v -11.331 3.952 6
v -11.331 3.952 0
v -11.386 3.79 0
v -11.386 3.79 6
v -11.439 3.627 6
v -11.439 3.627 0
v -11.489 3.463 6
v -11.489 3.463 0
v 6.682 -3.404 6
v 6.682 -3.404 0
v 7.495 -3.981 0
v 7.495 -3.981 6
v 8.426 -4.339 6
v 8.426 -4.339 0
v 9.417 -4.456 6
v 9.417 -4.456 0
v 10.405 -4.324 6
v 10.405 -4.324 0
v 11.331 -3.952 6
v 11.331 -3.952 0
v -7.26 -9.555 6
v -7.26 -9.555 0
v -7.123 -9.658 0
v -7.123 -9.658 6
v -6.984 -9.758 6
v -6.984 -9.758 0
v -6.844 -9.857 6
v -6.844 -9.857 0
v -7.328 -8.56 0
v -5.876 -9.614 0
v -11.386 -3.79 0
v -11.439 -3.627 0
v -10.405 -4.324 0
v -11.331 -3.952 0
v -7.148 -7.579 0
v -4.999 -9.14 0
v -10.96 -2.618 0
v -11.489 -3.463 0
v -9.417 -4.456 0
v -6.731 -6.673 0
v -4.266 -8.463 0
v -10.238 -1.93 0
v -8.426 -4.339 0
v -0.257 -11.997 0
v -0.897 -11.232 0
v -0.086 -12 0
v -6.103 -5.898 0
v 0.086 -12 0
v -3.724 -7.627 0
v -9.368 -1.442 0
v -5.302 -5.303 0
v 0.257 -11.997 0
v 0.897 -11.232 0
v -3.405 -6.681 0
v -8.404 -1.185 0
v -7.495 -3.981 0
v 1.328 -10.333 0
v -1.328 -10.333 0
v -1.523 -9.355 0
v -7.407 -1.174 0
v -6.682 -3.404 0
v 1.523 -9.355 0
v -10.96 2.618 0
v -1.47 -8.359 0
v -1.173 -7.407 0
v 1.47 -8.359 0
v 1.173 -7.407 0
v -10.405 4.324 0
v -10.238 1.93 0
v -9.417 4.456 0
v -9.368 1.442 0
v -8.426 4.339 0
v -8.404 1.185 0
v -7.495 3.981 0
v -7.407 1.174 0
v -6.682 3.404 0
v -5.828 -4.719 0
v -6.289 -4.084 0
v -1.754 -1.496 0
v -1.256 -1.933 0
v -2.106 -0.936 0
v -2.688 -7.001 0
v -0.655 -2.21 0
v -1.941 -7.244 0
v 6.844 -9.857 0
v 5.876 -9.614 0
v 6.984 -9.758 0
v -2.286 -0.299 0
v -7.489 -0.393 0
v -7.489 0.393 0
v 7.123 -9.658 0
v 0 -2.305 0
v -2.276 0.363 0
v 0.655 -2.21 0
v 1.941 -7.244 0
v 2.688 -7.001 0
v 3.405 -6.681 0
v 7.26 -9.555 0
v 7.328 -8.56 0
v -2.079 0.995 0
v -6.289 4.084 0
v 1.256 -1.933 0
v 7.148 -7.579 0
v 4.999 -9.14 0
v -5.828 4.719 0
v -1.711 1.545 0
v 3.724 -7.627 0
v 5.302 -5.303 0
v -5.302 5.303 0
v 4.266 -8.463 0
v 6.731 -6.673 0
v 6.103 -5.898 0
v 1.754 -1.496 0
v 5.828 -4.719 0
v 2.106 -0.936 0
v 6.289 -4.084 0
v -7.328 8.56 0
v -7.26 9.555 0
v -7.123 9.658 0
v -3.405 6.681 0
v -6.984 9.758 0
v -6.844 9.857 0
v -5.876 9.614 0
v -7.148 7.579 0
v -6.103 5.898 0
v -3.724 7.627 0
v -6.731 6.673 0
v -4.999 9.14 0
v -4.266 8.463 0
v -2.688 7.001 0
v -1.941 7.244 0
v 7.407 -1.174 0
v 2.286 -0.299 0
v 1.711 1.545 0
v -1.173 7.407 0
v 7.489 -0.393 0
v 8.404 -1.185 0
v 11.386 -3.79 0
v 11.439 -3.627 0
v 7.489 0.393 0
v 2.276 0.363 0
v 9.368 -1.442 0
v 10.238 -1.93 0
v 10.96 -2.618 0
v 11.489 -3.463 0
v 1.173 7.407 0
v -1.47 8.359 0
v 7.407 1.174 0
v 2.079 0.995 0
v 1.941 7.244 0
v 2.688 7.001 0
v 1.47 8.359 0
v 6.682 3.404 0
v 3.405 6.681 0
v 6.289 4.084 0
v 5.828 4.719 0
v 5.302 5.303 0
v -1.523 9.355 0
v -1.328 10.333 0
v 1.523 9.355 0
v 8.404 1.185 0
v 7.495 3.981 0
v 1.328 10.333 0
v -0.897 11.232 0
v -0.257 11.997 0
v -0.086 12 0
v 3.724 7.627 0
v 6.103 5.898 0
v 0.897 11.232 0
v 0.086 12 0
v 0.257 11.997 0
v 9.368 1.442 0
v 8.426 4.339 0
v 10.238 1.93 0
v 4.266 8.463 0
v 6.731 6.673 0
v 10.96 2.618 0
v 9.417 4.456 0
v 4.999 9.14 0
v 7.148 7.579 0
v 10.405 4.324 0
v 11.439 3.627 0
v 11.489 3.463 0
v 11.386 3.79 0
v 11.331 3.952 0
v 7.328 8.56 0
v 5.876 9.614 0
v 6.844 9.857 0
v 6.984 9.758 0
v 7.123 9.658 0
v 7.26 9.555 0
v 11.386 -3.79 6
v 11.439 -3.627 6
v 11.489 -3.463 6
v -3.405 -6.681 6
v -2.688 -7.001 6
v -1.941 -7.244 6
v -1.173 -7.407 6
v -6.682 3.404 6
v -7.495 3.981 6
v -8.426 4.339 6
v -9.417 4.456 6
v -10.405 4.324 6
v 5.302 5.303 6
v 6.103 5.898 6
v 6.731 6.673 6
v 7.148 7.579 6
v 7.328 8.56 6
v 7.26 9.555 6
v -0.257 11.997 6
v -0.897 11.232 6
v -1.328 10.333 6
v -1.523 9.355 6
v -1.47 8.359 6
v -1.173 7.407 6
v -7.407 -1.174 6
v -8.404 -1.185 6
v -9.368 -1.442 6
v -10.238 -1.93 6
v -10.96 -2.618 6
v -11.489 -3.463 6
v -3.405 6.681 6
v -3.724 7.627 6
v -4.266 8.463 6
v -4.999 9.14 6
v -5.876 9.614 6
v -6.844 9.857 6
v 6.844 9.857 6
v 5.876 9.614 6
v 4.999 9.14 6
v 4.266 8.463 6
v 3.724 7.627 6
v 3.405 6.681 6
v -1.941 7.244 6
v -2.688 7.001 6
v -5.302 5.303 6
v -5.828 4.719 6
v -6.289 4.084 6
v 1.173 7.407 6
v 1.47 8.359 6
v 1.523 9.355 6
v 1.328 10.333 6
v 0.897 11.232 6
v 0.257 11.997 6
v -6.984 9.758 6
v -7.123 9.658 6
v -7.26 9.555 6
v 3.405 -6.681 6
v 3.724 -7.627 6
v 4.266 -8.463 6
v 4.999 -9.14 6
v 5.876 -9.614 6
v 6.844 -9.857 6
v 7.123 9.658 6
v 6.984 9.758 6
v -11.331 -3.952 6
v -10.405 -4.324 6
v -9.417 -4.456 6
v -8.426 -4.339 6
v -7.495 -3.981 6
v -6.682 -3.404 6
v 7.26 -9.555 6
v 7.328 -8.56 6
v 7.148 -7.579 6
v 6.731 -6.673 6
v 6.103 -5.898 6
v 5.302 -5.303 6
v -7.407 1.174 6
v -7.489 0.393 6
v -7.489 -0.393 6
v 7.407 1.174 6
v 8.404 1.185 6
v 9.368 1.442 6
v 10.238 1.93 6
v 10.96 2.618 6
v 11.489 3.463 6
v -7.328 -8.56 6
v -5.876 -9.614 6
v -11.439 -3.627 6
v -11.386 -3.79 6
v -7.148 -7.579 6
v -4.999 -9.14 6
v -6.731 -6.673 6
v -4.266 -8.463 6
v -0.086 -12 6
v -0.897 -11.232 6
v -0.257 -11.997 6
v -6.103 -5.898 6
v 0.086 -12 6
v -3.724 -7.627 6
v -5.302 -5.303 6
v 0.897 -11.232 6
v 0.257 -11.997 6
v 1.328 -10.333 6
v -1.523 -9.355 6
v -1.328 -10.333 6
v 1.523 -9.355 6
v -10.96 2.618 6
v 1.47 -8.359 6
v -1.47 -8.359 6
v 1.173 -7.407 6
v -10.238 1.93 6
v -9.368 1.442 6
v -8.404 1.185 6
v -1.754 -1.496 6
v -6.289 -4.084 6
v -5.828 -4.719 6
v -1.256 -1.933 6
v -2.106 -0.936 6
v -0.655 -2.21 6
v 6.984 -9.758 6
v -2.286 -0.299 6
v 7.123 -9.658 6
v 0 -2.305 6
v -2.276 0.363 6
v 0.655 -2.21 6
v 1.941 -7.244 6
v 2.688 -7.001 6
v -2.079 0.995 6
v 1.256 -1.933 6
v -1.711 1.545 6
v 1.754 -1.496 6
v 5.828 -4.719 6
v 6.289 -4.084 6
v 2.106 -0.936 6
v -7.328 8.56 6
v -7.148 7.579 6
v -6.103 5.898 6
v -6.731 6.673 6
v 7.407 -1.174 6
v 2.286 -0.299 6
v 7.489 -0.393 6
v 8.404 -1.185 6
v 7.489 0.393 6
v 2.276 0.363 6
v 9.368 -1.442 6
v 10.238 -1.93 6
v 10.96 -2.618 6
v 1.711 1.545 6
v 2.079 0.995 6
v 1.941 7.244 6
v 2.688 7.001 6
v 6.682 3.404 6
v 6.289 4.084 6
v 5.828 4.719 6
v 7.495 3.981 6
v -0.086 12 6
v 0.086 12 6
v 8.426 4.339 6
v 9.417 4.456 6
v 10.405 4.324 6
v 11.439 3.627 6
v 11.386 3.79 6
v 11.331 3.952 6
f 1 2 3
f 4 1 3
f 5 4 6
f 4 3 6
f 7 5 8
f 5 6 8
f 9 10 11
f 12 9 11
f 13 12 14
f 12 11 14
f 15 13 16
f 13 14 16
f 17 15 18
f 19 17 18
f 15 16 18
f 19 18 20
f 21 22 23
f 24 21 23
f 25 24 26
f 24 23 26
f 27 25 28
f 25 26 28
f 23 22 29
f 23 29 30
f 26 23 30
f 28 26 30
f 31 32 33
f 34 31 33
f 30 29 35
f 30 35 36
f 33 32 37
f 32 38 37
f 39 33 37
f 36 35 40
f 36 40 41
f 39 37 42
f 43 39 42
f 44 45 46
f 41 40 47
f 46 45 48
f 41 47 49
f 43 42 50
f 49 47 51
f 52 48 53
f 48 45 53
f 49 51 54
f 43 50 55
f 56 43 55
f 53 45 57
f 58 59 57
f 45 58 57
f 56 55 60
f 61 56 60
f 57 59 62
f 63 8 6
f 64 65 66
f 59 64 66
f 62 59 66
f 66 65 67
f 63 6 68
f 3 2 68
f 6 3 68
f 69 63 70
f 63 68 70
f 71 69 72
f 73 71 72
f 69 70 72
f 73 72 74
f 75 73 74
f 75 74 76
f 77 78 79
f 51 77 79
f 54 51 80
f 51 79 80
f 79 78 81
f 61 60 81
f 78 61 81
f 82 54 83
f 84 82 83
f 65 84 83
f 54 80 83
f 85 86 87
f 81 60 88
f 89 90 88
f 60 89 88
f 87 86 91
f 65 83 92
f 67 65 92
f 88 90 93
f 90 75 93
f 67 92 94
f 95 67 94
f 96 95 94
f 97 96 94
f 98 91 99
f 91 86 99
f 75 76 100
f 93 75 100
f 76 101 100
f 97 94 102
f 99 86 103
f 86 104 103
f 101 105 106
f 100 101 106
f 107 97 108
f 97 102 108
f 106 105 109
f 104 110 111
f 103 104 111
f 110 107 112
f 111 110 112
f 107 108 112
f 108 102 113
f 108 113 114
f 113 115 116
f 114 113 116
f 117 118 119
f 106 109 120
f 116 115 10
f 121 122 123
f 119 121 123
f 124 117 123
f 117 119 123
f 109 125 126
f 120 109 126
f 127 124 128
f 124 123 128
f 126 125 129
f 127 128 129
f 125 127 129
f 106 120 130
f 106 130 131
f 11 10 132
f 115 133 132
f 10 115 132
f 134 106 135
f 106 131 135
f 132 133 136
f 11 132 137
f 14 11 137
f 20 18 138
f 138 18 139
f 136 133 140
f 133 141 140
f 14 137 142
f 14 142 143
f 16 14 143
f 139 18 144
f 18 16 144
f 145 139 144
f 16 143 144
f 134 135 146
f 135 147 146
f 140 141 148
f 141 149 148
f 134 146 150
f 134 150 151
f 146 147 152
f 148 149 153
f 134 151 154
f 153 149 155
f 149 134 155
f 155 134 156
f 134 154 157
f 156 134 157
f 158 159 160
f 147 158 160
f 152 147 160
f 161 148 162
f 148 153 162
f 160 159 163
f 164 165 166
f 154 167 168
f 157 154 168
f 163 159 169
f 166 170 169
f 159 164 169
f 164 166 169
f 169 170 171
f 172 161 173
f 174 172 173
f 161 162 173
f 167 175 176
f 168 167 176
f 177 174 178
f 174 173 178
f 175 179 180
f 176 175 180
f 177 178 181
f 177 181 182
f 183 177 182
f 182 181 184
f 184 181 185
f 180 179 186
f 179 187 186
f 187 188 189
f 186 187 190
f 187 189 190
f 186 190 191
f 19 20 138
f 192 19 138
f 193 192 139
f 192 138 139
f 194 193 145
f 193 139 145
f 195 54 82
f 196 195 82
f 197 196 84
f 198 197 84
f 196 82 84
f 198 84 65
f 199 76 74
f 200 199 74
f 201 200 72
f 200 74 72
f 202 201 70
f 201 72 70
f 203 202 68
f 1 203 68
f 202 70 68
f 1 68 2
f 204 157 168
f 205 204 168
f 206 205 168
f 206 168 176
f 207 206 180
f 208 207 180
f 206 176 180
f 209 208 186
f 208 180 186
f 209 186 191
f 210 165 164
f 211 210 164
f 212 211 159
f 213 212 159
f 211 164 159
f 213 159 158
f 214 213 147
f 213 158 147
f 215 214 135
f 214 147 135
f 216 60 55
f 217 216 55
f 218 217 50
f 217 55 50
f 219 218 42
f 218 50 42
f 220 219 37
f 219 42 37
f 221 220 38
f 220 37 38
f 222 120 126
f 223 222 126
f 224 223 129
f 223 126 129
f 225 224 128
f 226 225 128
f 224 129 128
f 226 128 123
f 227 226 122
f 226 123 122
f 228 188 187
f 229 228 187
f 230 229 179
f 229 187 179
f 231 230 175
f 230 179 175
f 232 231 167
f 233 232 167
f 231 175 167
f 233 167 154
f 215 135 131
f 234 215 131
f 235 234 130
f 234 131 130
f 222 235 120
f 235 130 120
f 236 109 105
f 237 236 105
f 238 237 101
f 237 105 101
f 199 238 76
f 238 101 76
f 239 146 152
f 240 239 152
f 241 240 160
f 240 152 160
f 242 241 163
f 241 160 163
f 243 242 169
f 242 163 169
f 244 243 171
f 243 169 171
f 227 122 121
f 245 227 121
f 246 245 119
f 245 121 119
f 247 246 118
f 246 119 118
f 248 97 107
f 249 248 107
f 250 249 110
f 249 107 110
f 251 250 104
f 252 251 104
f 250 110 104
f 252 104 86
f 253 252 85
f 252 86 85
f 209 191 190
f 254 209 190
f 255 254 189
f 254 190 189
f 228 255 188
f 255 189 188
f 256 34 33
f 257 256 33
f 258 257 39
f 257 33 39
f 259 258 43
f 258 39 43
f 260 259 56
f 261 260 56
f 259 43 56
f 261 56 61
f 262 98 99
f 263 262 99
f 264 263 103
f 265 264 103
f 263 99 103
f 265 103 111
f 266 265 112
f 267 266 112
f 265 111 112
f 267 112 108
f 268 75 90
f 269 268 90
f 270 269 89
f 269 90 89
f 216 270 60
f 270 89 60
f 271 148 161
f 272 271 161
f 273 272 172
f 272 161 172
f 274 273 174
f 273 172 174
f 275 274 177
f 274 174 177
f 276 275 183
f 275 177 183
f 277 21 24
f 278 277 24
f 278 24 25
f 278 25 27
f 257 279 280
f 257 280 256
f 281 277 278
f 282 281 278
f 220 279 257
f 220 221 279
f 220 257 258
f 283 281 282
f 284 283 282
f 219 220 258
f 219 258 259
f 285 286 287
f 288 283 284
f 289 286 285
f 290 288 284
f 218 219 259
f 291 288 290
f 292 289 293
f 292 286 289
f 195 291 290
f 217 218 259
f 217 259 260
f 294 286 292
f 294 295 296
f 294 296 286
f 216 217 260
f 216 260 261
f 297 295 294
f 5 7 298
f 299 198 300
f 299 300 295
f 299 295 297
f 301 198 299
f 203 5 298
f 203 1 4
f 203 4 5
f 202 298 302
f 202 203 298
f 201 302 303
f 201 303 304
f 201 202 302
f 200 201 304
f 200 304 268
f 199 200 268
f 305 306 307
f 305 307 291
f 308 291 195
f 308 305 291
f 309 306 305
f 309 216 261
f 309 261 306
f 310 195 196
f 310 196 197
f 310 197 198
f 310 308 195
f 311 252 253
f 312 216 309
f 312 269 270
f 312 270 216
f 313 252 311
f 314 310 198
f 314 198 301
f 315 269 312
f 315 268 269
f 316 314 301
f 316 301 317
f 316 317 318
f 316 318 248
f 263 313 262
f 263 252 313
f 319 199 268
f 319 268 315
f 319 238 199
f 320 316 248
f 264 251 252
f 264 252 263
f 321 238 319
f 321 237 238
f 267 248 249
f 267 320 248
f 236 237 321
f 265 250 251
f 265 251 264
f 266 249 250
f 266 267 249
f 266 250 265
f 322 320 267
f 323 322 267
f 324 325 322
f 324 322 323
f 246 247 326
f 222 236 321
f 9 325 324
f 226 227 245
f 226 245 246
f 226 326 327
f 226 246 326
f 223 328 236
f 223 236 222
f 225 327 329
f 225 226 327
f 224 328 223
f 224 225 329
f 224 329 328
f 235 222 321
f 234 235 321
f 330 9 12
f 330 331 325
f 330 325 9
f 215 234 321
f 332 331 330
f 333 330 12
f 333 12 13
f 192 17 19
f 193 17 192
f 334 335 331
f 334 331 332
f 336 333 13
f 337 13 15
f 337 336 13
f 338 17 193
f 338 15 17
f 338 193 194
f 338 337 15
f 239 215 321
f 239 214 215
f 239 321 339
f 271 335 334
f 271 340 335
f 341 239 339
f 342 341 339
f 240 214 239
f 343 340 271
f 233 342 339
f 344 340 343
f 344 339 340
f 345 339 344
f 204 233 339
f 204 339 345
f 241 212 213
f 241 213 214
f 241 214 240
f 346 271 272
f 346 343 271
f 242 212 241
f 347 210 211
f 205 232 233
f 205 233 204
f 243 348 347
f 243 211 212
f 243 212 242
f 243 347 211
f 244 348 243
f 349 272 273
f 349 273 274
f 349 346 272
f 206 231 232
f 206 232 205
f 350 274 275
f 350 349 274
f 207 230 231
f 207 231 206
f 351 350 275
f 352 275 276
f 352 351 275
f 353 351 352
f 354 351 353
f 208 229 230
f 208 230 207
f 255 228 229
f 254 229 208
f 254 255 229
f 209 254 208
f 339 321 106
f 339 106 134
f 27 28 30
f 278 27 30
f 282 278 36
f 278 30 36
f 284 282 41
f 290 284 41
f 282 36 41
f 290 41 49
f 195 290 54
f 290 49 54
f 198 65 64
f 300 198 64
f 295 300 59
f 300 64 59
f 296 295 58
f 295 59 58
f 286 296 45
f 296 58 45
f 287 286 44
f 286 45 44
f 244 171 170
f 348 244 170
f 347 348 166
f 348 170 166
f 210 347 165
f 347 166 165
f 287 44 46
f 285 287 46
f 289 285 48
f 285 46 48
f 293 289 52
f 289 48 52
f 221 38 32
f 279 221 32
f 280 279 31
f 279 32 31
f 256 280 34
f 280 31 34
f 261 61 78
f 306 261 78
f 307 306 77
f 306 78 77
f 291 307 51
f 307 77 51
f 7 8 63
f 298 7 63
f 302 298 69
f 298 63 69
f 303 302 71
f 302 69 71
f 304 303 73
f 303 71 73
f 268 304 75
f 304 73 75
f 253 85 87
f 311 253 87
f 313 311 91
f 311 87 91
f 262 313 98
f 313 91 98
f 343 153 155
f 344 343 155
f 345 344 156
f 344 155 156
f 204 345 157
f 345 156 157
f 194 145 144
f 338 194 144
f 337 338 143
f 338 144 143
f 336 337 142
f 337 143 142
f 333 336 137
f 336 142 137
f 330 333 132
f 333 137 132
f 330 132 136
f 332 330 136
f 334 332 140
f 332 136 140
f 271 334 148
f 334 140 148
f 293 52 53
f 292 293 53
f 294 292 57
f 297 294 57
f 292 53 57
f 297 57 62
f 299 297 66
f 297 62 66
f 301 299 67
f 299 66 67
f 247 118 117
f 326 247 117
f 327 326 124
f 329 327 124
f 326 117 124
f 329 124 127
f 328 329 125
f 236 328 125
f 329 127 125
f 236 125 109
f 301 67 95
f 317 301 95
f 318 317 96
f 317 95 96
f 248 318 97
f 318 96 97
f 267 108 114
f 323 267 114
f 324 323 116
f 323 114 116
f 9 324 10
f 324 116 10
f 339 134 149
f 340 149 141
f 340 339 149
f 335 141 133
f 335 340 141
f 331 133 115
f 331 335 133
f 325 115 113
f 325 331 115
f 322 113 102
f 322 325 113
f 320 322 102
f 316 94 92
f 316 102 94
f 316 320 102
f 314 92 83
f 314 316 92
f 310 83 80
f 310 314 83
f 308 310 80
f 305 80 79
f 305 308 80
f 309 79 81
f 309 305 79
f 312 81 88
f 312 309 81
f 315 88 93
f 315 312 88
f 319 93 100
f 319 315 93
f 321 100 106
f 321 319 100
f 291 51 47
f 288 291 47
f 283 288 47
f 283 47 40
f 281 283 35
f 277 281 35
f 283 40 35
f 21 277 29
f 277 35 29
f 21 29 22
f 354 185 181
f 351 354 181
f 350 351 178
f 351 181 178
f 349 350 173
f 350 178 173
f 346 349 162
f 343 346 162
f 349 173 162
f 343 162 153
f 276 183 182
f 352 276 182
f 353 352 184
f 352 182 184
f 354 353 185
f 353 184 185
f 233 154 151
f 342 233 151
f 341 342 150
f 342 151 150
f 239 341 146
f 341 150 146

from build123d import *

# Parameters (mm, degrees)
SKETCH4_R           = 2
BOSS_EXTRUDE3_DEPTH = 6
SKETCH6_R           = 3.276903459
BOSS_EXTRUDE4_DEPTH = 6
CUT_EXTRUDE2_DEPTH  = 10


with BuildPart() as part:
    # Sketch4 → Boss-Extrude3 (new body)
    with BuildSketch(Plane.XY):
        with BuildLine():
            ThreePointArc((11.330682707, 3.9516616), (8.917819898, 4.428819506), (6.681915604, 3.403968986))
            ThreePointArc((6.681915604, 3.403968986), (6.066818441, 4.407801607), (5.302192362, 5.302995112))
            ThreePointArc((5.302192362, 5.302995112), (6.967815552, 7.112770233), (7.259627029, 9.554989032))
            ThreePointArc((7.259627029, 9.554989032), (7.053423028, 9.708203932), (6.843986457, 9.856969584))
            ThreePointArc((6.843986457, 9.856969584), (4.61147306, 8.824753264), (3.40498051, 6.681400208))
            ThreePointArc((3.40498051, 6.681400208), (2.317318441, 7.131972816), (1.172541409, 7.406763642))
            ThreePointArc((1.172541409, 7.406763642), (1.456299749, 9.849931218), (0.256880001, 11.997250213))
            ThreePointArc((0.256880001, 11.997250213), (0, 12), (-0.256880001, 11.997250213))
            ThreePointArc((-0.256880001, 11.997250213), (-1.456299749, 9.849931218), (-1.172541409, 7.406763642))
            ThreePointArc((-1.172541409, 7.406763642), (-2.317318441, 7.131972816), (-3.404980509, 6.681400207))
            ThreePointArc((-3.404980509, 6.681400207), (-4.61147306, 8.824753264), (-6.843986457, 9.856969584))
            ThreePointArc((-6.843986457, 9.856969584), (-7.053423028, 9.708203933), (-7.259627029, 9.554989032))
            ThreePointArc((-7.259627029, 9.554989032), (-6.967815552, 7.112770233), (-5.302192362, 5.302995112))
            ThreePointArc((-5.302192362, 5.302995112), (-6.066818441, 4.407801607), (-6.681915604, 3.403968986))
            ThreePointArc((-6.681915604, 3.403968986), (-8.917819898, 4.428819506), (-11.330682707, 3.9516616))
            ThreePointArc((-11.330682707, 3.9516616), (-11.412678196, 3.708203933), (-11.489443278, 3.463046803))
            ThreePointArc((-11.489443278, 3.463046803), (-9.817862641, 1.658772773), (-7.406586048, 1.173662691))
            ThreePointArc((-7.406586048, 1.173662691), (-7.499, 0), (-7.406586048, -1.173662691))
            ThreePointArc((-7.406586048, -1.173662691), (-9.817862641, -1.658772773), (-11.489443278, -3.463046803))
            ThreePointArc((-11.489443278, -3.463046803), (-11.412678196, -3.708203933), (-11.330682707, -3.9516616))
            ThreePointArc((-11.330682707, -3.9516616), (-8.917819898, -4.428819506), (-6.681915604, -3.403968986))
            ThreePointArc((-6.681915604, -3.403968986), (-6.066818441, -4.407801607), (-5.302192362, -5.302995112))
            ThreePointArc((-5.302192362, -5.302995112), (-6.967815552, -7.112770233), (-7.259627029, -9.554989032))
            ThreePointArc((-7.259627029, -9.554989032), (-7.053423028, -9.708203932), (-6.843986457, -9.856969584))
            ThreePointArc((-6.843986457, -9.856969584), (-4.61147306, -8.824753264), (-3.404980509, -6.681400207))
            ThreePointArc((-3.404980509, -6.681400207), (-2.317318441, -7.131972816), (-1.172541409, -7.406763642))
            ThreePointArc((-1.172541409, -7.406763642), (-1.456299749, -9.849931218), (-0.256880001, -11.997250213))
            ThreePointArc((-0.256880001, -11.997250213), (0, -12), (0.256880001, -11.997250213))
            ThreePointArc((0.256880001, -11.997250213), (1.456299749, -9.849931218), (1.172541409, -7.406763642))
            ThreePointArc((1.172541409, -7.406763642), (2.317318441, -7.131972816), (3.404980509, -6.681400207))
            ThreePointArc((3.404980509, -6.681400207), (4.61147306, -8.824753264), (6.843986457, -9.856969584))
            ThreePointArc((6.843986457, -9.856969584), (7.053423027, -9.708203933), (7.259627029, -9.554989032))
            ThreePointArc((7.259627029, -9.554989032), (6.967815552, -7.112770233), (5.302192362, -5.302995112))
            ThreePointArc((5.302192362, -5.302995112), (6.066818441, -4.407801607), (6.681915604, -3.403968986))
            ThreePointArc((6.681915604, -3.403968986), (8.917819898, -4.428819506), (11.330682707, -3.9516616))
            ThreePointArc((11.330682707, -3.9516616), (11.412678196, -3.708203932), (11.489443278, -3.463046803))
            ThreePointArc((11.489443278, -3.463046803), (9.817862641, -1.658772773), (7.406586048, -1.173662691))
            ThreePointArc((7.406586048, -1.173662691), (7.499, 0), (7.406586048, 1.173662691))
            ThreePointArc((7.406586048, 1.173662691), (9.817862641, 1.658772773), (11.489443278, 3.463046803))
            ThreePointArc((11.489443278, 3.463046803), (11.412678196, 3.708203932), (11.330682707, 3.9516616))
        make_face()
        Circle(SKETCH4_R, mode=Mode.SUBTRACT)
    extrude(amount=BOSS_EXTRUDE3_DEPTH)

    # Sketch6 → Boss-Extrude4 (add)
    with BuildSketch(Plane.XY.offset(6)):
        Circle(SKETCH6_R)
    extrude(amount=-BOSS_EXTRUDE4_DEPTH)

    # Sketch7 → Cut-Extrude2 (cut)
    with BuildSketch(Plane.XY.offset(6)):
        with BuildLine():
            Line((-1.710555465, 1.545), (1.710555465, 1.545))
            ThreePointArc((1.710555465, 1.545), (0, -2.305), (-1.710555465, 1.545))
        make_face()
    extrude(amount=-CUT_EXTRUDE2_DEPTH, mode=Mode.SUBTRACT)


solid = part.part
